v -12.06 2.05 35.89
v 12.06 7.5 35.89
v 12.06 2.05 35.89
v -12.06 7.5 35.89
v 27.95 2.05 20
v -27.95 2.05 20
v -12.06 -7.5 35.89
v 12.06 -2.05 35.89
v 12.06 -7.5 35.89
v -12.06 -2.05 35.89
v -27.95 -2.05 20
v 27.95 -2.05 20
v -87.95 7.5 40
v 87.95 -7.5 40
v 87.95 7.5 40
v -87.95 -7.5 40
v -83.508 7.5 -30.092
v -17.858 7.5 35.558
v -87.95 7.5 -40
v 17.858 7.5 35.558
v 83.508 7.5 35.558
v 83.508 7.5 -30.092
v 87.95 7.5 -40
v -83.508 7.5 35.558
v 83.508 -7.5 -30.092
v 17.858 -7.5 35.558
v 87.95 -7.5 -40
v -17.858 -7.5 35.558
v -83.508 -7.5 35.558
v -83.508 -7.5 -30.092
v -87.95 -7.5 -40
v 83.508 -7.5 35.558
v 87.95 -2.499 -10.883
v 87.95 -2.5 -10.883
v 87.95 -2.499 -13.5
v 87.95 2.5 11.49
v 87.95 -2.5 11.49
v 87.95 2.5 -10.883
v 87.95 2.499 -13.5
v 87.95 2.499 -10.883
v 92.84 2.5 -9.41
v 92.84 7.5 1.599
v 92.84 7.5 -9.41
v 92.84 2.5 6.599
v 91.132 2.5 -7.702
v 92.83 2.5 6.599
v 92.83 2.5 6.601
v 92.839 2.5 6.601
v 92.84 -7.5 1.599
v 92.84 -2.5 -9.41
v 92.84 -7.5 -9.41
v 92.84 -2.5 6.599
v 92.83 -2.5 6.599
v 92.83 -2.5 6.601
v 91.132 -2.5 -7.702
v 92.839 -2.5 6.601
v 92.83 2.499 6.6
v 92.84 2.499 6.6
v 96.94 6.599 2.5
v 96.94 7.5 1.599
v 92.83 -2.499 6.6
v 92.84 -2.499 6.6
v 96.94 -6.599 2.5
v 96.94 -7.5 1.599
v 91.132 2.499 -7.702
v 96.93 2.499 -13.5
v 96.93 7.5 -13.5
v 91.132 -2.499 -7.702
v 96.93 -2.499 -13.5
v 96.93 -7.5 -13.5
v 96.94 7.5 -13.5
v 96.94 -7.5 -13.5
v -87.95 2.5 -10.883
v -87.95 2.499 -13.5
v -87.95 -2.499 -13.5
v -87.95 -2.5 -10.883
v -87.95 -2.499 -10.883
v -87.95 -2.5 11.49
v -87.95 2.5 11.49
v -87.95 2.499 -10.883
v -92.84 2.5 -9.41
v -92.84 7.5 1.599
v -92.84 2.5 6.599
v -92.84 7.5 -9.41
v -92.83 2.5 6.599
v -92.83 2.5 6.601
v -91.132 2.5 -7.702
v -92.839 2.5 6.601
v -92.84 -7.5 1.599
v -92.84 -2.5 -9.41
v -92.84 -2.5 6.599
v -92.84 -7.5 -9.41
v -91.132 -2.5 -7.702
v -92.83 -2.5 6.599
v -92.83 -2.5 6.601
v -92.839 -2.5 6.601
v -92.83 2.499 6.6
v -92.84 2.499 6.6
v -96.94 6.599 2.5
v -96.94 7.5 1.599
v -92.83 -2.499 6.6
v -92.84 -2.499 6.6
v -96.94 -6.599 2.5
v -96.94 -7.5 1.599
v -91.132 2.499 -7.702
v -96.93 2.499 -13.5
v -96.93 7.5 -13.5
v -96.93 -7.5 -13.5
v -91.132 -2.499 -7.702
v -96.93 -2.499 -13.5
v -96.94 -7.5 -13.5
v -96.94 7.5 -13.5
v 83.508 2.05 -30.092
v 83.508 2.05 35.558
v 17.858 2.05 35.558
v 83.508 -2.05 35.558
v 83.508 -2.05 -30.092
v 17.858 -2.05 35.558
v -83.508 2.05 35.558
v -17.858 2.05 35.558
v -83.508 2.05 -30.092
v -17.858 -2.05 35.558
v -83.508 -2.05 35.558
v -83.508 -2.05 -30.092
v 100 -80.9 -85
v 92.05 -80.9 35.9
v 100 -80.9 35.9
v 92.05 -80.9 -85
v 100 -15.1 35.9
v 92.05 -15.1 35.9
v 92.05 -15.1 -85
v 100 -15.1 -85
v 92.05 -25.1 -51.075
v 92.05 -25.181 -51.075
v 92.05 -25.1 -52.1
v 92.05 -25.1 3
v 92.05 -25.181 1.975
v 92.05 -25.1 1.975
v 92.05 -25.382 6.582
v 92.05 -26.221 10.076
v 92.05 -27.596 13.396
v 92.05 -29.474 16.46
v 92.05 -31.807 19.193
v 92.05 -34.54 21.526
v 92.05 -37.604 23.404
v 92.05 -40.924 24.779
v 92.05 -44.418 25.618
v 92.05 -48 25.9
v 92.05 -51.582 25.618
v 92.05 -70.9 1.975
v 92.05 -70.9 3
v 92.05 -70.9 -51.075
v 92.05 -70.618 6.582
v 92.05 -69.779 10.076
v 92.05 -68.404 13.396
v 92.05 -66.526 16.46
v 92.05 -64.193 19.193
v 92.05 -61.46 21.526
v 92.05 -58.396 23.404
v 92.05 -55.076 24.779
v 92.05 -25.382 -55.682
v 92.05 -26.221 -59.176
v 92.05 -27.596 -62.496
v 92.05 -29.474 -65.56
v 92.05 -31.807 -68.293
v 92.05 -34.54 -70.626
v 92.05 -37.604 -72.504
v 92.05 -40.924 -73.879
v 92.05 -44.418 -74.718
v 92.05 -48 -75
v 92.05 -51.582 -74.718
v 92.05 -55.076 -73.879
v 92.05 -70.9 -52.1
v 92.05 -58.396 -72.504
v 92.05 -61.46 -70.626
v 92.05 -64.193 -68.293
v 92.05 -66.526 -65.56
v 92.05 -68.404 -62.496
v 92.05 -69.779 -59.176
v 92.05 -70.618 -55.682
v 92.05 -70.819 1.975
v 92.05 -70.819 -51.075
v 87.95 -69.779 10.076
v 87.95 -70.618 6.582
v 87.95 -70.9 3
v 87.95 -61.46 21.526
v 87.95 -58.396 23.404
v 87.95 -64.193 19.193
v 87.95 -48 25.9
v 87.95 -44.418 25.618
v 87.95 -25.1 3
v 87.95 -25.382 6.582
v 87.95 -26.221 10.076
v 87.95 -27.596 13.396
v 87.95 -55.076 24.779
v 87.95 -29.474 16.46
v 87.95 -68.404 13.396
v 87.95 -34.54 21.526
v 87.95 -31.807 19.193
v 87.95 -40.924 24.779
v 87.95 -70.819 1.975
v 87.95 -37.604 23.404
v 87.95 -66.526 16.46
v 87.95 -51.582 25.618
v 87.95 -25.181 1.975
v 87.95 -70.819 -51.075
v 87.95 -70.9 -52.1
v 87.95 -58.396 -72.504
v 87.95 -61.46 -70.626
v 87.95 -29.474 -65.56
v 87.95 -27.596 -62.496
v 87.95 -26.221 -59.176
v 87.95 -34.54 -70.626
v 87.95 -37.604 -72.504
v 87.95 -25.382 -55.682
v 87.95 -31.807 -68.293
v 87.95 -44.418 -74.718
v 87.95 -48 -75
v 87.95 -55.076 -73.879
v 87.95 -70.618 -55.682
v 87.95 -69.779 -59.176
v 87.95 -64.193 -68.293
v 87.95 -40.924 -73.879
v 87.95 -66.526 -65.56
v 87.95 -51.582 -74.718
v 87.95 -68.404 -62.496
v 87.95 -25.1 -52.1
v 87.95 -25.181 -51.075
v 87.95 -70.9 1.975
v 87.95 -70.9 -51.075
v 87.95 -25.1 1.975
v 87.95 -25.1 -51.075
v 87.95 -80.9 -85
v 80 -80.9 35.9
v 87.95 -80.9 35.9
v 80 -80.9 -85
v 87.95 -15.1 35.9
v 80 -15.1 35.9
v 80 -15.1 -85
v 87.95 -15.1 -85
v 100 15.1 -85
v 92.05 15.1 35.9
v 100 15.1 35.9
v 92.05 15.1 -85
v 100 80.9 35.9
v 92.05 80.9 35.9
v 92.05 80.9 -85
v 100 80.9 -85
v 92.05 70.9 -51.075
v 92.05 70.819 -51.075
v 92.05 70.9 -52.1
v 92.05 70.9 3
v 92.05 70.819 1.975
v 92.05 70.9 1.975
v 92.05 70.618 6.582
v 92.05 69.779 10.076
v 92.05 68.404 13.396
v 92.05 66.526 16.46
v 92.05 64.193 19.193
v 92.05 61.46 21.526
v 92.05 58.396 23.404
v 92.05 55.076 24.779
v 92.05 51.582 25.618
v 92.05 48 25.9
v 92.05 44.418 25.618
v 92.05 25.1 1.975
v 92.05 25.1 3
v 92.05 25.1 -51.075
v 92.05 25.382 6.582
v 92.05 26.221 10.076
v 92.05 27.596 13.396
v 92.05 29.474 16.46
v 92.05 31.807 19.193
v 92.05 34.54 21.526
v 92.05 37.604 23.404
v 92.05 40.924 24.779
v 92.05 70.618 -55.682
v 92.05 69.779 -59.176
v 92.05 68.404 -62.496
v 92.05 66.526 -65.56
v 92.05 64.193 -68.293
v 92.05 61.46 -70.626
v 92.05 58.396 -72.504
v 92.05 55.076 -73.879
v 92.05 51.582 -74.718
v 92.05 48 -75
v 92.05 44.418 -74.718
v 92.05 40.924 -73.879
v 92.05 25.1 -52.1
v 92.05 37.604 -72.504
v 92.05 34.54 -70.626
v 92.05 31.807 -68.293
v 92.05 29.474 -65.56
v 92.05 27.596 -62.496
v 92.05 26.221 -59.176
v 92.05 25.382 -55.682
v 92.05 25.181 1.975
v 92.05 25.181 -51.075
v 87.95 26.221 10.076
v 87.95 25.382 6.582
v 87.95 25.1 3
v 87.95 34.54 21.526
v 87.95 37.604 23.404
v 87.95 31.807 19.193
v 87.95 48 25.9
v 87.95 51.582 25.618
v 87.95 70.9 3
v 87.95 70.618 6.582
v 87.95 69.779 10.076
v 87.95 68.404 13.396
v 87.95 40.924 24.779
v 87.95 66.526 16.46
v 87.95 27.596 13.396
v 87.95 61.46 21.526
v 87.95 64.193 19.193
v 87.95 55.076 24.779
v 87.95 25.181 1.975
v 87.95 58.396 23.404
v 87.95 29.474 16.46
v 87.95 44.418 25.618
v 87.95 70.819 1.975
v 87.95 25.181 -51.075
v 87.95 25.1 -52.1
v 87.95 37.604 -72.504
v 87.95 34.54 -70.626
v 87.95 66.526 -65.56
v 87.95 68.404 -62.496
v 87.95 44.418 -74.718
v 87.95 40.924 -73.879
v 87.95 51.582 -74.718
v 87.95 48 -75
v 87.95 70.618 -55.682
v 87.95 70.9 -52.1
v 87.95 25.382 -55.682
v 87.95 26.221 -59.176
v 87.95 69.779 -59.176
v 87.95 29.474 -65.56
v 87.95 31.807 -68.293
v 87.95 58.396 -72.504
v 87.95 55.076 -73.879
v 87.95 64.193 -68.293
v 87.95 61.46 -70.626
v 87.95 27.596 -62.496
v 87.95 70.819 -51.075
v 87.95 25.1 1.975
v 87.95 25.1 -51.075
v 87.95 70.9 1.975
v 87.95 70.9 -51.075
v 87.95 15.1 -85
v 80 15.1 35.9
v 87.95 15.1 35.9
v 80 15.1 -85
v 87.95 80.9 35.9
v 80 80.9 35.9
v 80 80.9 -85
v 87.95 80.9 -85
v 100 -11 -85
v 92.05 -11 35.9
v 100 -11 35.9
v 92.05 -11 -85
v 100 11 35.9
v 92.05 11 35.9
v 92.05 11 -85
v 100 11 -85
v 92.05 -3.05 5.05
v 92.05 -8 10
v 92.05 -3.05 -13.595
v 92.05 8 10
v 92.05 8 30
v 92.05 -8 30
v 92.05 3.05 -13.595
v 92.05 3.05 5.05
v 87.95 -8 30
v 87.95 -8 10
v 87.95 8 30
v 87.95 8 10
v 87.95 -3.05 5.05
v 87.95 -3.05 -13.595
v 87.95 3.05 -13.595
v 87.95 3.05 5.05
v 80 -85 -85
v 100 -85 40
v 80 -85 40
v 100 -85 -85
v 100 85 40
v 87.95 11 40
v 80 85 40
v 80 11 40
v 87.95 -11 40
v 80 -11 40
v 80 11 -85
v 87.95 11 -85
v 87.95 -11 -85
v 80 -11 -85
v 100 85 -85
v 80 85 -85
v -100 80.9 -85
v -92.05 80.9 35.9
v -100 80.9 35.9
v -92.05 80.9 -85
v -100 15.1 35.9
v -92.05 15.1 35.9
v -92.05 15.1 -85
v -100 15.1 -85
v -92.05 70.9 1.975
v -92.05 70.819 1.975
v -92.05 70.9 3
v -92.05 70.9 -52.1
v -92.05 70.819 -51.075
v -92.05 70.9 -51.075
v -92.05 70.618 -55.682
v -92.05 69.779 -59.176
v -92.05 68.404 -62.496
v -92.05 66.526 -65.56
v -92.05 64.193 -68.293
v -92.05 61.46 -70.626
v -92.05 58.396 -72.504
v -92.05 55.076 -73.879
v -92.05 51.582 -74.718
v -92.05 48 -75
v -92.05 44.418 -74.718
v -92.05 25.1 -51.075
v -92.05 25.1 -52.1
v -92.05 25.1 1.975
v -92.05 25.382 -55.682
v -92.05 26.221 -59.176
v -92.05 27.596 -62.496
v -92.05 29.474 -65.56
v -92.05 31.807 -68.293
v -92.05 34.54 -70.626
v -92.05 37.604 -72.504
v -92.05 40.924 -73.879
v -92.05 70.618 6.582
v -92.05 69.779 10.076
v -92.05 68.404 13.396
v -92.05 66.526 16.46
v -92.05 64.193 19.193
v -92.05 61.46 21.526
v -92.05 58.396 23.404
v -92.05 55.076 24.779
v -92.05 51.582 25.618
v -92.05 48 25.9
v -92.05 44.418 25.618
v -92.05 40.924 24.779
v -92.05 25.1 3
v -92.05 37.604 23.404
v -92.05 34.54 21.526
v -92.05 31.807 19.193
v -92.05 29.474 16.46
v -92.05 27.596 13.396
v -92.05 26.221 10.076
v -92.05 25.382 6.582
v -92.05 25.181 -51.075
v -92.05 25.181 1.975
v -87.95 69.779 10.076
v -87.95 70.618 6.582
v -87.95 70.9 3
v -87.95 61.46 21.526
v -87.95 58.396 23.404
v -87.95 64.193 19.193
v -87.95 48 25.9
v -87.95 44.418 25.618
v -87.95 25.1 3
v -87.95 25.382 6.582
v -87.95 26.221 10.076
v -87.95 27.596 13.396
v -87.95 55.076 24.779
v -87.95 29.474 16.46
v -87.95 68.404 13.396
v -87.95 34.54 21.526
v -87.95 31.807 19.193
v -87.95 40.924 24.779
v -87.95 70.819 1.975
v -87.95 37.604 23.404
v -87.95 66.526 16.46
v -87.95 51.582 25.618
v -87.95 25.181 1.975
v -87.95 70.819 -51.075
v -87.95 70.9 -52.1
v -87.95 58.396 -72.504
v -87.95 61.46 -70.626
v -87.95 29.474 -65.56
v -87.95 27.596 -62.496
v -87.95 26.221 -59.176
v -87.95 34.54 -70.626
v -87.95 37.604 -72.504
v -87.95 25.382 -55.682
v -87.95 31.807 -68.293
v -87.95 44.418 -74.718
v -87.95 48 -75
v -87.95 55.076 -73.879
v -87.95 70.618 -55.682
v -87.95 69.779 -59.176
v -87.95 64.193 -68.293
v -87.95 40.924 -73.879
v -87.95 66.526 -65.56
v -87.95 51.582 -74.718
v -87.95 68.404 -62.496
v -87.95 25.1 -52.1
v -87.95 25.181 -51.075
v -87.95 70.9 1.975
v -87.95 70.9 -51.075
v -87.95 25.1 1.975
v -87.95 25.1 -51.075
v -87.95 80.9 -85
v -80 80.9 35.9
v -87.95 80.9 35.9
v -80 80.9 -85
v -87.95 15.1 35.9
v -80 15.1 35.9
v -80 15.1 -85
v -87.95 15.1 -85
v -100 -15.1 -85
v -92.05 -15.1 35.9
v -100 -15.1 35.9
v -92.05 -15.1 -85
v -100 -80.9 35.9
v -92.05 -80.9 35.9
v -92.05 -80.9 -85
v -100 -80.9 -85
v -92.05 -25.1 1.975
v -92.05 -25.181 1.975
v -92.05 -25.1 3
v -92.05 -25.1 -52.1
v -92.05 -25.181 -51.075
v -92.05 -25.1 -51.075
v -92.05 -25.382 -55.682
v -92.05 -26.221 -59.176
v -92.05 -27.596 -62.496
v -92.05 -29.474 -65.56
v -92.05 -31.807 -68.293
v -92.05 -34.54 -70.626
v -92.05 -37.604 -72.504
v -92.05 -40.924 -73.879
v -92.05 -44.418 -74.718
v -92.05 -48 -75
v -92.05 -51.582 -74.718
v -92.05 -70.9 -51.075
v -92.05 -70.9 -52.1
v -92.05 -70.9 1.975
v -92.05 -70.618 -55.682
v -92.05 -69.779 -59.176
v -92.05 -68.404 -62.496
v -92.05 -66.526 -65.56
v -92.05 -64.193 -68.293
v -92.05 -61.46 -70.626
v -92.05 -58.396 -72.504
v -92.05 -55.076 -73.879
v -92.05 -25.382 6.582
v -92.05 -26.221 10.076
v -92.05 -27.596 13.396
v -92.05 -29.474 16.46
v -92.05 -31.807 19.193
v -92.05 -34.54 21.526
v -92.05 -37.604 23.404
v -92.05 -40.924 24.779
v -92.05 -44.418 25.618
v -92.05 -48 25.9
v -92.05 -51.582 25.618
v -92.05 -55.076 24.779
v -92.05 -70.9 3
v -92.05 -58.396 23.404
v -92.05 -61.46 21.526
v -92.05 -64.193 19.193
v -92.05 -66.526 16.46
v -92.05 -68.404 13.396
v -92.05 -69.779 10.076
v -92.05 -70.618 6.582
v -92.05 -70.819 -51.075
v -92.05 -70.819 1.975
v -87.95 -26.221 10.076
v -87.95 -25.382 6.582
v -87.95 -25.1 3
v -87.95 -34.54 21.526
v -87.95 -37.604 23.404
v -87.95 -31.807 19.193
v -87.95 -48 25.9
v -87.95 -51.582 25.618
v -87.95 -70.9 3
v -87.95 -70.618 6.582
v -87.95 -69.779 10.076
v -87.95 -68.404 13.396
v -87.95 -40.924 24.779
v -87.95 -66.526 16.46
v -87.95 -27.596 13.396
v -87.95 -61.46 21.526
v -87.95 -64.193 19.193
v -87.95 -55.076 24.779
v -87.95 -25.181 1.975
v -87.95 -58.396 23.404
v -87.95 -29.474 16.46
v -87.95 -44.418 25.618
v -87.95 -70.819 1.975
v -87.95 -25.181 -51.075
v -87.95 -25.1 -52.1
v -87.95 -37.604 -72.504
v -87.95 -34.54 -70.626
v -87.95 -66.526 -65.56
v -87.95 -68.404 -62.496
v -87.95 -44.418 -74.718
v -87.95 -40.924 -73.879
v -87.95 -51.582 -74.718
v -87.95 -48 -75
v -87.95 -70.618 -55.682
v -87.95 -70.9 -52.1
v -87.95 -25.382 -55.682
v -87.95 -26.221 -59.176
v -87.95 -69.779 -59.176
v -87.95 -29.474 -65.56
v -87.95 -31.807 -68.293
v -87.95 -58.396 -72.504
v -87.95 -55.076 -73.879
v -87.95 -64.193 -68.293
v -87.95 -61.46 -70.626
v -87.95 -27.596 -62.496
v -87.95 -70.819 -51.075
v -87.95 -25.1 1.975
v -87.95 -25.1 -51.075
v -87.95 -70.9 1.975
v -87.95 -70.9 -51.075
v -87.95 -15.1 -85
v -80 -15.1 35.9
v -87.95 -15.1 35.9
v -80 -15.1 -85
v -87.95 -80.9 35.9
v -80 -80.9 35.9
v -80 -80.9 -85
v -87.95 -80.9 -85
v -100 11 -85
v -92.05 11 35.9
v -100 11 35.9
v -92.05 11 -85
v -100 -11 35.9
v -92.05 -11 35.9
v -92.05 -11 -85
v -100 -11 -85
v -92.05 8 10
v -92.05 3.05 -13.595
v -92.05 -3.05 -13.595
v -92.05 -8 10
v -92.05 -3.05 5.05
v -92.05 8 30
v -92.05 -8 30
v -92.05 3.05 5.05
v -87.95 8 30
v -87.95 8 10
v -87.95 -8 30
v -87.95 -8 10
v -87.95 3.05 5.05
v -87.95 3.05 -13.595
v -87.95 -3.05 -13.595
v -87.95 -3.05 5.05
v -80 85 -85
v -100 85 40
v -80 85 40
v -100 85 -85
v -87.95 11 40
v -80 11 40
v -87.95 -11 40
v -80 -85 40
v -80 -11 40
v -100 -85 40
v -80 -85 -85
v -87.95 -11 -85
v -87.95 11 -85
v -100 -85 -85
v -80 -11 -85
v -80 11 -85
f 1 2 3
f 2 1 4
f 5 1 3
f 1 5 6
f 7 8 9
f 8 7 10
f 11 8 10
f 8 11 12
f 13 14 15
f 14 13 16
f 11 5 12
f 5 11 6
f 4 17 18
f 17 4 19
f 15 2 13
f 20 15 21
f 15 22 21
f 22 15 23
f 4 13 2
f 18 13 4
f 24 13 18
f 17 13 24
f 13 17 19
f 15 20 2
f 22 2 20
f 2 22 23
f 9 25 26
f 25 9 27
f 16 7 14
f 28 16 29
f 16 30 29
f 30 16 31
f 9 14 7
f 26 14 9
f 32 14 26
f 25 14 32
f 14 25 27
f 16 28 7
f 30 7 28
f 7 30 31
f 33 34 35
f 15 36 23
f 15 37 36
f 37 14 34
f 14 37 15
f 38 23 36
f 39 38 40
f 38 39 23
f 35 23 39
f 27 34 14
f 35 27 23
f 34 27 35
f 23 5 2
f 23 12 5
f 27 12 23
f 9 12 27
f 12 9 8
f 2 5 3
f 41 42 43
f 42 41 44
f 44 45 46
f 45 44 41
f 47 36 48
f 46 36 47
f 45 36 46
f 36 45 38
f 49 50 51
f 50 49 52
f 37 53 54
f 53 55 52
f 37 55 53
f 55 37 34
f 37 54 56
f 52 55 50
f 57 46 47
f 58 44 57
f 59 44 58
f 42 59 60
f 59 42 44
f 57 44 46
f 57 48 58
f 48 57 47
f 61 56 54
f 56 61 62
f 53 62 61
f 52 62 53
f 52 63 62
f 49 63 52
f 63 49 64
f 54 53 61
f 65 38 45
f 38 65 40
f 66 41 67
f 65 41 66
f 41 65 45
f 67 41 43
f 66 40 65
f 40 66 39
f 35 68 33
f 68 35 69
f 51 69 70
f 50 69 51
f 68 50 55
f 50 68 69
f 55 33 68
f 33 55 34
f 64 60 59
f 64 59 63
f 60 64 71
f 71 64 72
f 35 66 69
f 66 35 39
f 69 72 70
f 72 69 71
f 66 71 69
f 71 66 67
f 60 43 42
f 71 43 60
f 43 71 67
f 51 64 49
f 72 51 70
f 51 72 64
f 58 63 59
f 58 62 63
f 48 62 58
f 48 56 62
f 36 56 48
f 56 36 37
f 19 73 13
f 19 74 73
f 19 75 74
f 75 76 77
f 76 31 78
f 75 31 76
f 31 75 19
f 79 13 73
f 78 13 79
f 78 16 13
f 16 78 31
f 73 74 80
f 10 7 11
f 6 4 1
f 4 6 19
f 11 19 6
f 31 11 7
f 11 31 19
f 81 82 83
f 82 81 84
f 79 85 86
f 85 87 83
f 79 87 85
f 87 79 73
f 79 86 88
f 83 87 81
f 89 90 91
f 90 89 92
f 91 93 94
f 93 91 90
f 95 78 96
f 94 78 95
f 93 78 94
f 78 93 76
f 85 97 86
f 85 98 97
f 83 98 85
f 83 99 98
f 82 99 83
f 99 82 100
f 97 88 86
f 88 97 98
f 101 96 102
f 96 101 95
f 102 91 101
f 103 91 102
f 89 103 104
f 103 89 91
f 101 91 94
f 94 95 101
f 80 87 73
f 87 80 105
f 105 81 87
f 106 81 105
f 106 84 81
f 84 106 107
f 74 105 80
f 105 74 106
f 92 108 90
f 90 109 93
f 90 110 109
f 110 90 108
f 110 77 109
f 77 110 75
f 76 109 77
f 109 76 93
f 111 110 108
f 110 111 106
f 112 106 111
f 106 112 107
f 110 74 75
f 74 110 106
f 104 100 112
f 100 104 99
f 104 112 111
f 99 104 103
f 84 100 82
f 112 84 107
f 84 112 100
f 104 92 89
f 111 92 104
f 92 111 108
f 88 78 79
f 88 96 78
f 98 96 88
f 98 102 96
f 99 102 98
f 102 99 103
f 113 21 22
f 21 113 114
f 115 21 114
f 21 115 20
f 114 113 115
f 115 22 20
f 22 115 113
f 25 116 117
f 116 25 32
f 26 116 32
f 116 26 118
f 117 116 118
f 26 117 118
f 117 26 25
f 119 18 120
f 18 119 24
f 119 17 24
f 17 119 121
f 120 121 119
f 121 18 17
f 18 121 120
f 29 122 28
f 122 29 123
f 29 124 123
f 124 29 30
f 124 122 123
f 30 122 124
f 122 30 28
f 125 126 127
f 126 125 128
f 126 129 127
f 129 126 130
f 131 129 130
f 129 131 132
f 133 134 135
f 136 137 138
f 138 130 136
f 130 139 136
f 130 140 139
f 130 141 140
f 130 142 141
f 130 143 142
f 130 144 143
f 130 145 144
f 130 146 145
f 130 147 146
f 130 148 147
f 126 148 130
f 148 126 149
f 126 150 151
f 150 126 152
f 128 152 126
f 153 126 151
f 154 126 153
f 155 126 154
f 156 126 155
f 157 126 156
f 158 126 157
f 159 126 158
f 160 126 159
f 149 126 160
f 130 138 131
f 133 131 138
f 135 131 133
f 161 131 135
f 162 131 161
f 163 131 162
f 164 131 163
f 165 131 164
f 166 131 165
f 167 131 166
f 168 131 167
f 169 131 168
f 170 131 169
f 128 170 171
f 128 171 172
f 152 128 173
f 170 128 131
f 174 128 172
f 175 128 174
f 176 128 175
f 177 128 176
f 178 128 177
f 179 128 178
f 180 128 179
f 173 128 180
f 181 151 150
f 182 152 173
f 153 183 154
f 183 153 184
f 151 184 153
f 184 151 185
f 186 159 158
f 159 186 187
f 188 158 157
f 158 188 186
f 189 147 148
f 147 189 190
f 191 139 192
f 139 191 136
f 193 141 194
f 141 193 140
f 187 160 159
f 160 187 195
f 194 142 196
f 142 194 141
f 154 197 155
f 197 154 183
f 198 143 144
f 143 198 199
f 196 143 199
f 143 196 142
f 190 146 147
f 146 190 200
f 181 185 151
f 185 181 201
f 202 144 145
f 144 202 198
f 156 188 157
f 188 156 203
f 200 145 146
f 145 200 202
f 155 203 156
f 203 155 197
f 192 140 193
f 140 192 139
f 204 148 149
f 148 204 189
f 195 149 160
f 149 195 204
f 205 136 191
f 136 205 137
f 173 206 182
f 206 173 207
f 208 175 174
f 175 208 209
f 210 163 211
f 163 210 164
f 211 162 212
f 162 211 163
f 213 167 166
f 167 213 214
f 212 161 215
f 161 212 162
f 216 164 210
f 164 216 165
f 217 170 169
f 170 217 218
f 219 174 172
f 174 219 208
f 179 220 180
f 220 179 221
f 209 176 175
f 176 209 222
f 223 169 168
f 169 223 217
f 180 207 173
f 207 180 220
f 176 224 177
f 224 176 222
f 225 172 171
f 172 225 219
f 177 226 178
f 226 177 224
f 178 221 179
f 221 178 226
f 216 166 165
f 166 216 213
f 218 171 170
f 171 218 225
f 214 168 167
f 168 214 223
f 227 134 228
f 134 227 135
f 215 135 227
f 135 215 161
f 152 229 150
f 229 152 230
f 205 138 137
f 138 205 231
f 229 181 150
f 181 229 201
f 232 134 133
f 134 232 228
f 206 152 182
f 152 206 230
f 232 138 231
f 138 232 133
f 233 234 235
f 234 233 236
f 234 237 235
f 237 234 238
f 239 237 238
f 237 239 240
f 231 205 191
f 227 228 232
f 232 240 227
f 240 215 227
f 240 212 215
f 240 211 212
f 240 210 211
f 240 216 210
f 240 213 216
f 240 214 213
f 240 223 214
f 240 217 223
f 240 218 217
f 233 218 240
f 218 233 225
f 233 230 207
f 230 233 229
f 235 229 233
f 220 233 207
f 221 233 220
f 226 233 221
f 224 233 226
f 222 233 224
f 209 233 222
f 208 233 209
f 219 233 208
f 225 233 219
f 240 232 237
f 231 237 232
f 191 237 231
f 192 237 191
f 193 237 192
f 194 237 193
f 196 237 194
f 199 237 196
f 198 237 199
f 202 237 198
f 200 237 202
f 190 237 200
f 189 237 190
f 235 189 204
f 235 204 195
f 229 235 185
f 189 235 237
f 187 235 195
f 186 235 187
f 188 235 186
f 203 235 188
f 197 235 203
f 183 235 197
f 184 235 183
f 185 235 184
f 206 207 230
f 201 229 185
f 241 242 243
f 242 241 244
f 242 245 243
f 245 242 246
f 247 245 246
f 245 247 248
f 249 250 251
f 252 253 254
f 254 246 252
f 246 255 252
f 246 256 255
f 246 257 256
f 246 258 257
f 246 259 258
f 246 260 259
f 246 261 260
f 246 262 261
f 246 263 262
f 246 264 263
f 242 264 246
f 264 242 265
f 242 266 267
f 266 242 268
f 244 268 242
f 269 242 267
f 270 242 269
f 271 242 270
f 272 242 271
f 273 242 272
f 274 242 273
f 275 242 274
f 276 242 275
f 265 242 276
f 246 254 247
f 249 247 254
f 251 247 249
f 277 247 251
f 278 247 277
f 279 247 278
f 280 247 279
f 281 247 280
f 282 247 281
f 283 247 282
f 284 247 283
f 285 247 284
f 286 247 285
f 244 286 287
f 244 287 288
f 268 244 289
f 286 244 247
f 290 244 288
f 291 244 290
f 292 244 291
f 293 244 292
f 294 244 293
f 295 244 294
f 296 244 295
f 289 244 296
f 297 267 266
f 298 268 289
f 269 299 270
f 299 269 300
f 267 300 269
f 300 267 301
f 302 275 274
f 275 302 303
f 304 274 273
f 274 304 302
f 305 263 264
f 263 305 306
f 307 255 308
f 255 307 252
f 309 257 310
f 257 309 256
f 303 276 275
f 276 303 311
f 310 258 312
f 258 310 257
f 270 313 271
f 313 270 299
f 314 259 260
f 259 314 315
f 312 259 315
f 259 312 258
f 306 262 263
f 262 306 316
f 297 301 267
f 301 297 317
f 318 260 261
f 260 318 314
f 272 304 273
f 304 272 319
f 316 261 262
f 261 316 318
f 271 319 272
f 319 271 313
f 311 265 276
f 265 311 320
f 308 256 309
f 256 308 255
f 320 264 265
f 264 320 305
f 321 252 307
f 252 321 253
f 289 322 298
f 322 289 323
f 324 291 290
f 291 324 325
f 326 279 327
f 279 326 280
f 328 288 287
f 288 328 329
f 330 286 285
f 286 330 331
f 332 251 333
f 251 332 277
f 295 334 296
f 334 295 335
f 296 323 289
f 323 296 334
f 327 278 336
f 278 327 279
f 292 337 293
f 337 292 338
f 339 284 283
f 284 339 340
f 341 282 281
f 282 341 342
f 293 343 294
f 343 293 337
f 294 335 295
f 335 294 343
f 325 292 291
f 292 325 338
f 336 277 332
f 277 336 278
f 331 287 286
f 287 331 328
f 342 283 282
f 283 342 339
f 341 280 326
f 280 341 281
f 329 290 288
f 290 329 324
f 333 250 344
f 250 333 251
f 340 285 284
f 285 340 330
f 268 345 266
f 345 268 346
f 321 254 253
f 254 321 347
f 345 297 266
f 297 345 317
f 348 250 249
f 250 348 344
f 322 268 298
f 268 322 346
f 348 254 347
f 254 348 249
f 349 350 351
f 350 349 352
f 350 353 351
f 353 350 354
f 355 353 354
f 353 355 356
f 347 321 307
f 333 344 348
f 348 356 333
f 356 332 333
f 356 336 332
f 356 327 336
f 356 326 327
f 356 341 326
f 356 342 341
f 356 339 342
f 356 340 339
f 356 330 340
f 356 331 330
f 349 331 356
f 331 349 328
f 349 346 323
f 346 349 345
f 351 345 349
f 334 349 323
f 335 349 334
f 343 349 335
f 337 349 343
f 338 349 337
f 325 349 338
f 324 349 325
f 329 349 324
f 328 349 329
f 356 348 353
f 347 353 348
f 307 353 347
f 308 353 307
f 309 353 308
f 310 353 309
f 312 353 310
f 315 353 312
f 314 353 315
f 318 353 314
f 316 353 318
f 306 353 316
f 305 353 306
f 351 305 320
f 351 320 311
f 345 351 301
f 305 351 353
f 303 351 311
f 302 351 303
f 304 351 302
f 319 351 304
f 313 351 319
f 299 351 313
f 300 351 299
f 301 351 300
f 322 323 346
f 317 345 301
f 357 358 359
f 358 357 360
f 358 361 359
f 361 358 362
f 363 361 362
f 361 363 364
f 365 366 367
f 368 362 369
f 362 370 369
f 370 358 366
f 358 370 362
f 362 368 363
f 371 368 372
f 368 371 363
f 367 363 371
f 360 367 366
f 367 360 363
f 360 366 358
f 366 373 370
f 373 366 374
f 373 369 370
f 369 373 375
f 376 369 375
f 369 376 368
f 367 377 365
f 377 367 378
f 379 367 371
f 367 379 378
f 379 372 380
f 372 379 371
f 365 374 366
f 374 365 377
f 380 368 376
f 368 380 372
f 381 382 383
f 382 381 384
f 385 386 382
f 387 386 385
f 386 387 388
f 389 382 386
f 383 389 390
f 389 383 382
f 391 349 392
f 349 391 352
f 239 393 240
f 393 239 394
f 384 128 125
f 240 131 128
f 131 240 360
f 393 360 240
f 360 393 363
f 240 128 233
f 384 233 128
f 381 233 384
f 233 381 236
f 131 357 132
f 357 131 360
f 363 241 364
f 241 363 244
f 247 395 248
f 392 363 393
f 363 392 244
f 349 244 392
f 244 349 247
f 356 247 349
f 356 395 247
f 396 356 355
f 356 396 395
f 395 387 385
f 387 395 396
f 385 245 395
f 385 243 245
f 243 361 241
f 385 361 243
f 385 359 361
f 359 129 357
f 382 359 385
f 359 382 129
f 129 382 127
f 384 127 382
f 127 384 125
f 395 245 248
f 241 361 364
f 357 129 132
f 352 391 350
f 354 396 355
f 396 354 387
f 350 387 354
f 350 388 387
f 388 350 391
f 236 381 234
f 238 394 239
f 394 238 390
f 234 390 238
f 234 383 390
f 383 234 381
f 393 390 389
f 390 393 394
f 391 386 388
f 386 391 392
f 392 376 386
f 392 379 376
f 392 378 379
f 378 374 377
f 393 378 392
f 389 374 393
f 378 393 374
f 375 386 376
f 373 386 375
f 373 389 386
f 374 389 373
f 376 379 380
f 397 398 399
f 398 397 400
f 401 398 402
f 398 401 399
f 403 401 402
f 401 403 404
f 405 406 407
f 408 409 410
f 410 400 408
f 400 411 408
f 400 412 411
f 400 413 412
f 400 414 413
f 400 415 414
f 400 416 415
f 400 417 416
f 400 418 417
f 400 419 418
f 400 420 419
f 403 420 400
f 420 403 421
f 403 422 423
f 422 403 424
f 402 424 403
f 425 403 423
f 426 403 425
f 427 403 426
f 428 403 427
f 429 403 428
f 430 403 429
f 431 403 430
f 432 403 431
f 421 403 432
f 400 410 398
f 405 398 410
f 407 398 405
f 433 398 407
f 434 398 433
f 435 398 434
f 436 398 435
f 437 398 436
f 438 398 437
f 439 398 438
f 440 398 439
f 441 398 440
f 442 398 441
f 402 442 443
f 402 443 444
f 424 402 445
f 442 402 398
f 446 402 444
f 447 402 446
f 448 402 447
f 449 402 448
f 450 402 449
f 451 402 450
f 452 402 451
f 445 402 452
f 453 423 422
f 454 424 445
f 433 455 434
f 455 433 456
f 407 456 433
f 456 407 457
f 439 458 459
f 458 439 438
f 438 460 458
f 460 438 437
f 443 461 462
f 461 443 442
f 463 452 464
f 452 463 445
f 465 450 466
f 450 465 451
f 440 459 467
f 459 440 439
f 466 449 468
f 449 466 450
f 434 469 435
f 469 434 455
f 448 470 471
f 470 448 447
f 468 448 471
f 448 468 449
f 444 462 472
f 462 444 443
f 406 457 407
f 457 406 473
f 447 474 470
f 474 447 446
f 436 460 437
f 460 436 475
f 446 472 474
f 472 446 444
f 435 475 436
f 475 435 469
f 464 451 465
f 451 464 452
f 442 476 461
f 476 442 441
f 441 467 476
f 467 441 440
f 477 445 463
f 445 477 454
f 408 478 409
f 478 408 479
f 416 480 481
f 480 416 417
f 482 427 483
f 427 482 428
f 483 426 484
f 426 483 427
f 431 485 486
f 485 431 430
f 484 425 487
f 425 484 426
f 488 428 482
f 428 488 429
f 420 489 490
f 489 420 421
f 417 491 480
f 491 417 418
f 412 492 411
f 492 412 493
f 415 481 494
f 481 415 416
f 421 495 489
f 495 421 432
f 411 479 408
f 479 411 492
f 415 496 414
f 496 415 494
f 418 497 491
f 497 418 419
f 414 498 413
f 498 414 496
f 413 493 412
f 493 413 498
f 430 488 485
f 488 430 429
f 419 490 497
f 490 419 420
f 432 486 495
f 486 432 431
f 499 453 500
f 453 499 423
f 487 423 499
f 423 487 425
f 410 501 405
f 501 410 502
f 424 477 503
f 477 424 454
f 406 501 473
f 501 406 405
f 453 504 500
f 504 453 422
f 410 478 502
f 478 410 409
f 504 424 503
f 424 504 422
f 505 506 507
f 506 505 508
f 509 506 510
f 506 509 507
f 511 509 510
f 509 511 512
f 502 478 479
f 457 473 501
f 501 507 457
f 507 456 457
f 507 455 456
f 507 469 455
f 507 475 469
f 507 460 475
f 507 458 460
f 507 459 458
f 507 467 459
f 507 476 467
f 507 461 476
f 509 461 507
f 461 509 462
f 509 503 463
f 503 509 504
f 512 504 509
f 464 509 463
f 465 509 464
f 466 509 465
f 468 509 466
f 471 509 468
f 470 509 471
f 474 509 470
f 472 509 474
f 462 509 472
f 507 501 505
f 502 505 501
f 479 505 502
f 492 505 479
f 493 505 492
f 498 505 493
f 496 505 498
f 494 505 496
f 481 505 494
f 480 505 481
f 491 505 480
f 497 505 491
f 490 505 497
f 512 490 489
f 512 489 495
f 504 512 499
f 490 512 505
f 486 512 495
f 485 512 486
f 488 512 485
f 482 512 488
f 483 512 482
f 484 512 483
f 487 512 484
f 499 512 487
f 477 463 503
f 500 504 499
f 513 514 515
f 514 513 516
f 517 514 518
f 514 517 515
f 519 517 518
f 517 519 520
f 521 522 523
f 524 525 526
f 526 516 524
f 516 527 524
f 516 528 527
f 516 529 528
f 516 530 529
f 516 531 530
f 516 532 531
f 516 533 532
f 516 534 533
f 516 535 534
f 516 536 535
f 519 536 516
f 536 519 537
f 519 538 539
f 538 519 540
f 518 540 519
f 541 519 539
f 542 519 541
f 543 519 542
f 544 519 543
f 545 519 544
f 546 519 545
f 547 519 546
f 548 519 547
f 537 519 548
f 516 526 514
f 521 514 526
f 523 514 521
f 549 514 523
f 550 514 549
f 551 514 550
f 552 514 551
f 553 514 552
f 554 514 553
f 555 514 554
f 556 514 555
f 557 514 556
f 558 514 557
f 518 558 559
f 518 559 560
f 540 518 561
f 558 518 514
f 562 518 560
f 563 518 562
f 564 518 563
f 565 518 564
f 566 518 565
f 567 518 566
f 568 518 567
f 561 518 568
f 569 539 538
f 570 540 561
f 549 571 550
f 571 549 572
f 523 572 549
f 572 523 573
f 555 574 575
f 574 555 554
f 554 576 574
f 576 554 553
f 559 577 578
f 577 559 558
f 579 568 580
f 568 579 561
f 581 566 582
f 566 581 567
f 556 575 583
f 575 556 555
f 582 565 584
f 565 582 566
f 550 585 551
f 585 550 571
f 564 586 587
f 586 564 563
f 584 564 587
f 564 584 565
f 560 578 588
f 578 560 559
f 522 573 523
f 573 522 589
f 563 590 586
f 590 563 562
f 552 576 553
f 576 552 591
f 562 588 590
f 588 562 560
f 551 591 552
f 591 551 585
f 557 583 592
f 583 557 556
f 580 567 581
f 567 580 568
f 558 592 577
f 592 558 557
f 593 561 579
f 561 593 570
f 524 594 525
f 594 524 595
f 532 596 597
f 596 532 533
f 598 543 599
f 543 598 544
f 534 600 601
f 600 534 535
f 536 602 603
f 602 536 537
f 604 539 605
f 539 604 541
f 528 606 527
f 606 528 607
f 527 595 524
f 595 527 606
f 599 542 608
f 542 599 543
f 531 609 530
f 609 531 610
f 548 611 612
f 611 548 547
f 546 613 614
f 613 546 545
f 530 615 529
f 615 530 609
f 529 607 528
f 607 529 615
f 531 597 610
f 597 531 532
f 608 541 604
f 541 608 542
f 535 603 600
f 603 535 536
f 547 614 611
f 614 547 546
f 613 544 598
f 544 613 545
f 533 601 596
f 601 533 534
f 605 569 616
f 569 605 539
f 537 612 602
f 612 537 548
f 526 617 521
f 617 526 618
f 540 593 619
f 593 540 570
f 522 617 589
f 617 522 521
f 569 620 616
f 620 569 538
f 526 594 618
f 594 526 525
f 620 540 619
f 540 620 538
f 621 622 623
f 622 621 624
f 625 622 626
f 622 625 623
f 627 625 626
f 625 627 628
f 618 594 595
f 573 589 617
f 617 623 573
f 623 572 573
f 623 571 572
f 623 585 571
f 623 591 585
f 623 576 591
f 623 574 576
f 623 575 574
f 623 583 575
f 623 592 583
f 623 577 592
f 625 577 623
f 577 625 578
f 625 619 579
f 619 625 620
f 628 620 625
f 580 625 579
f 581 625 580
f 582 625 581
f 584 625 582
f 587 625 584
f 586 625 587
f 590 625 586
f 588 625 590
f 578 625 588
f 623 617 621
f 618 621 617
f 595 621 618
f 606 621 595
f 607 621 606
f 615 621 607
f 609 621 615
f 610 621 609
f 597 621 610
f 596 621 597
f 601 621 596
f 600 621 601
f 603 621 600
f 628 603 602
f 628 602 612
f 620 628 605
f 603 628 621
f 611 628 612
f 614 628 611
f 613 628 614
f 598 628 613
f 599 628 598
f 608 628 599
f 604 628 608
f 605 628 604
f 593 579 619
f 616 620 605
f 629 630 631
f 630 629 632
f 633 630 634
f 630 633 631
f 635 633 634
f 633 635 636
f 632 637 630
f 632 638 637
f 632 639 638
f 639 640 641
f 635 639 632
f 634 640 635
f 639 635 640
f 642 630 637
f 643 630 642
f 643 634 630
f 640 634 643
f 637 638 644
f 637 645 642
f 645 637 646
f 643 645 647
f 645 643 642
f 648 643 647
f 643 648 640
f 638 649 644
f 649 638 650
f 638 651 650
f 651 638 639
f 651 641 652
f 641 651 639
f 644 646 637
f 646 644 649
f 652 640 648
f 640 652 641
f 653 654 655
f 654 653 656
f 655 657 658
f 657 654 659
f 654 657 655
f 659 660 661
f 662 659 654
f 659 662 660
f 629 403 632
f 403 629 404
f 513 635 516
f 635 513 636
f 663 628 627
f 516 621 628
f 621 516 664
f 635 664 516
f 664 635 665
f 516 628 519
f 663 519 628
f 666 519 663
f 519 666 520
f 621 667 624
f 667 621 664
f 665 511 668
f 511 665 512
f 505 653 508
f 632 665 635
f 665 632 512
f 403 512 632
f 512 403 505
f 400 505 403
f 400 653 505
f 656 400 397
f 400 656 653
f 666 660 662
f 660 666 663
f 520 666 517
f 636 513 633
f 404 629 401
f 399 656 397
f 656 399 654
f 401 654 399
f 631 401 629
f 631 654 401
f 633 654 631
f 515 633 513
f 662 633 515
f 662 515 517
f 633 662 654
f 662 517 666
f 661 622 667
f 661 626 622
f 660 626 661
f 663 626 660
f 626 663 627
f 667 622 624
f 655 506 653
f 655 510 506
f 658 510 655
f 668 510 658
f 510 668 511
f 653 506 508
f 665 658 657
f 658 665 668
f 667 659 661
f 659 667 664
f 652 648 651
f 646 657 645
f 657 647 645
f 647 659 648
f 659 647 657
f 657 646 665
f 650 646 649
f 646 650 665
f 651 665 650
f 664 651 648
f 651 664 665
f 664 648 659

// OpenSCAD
// Measure left to right of monitor base from outer edge of monitor's rubber feet (mm).
Stand_Width = 200;          // [100:300]

// Measure front to rear of monitor base (mm).
Stand_Depth = 170;          // [100:300]

// Overall height of the stand (mm).
Stand_Height = 125;         // [80:300]

// Width of side walls, should at least match the diameter of the monitor's rubber feet.
Wall_Width = 20;            // [10:50]

// Applies to the thickness of everything.
Overall_Thickness = 4.1;    // [0.1:0.1:9.9]

// Adds error compensation to interlock joint gaps, use the fitment test print to trial for your printer.
Fitment_Adjust = 0.8;       // [0:0.1:3]

// Leave off to speed up viewing, enable before creating.
Rounded_Corners = "No";     // [Yes,No]

// Select part to view.
Build = "Assembled";        // [Wall:Wall,Support:Support,Assembled:Assembled Stand,Fit_Test:Joint fitment test, Print_Bed:All 3 parts laid out for printing]

/* [Hidden] */

WW = Wall_Width;                                    // Wall Width
TH = Overall_Thickness;                             // Thickness
L = Stand_Width - WW - TH;                          // Length
W = Stand_Depth;                                    // Width
H = Stand_Height;                                   // Height
FW = 10;                                            // Section Frame Width
CW = 22;                                            // Center Width
R = (Rounded_Corners == "Yes" ? 3.5 : 0);           // Rounded Edge Radius
TA = Fitment_Adjust;                                // Joint gap fitment compensation adjustment
SW = 15;                                            // Support Width
SH = 20;                                            // Support Height
TL = 80;                                            // Triangle Length
LH = 25;                                            // Latch Height
LP = 1;                                             // Latch Position
HP = 10;                                            // Hole Position
HH = 20;                                            // Hole Height
HW = 16;                                            // Hole Width
GH = 23.6;                                          // Gap Height
GW = 5.3;                                           // Gap Width
WR = ((W / 2) - ((TH + FW) * 2) - (CW / 2)) / 2;    // Frame void radius if height is within limit
HR = (H - TH - (FW * 2)) / 2;                       // Frame void radius if height is outside limit
$fn = 40;                                           // Number of sides in a circle

// Build wall
if(Build == "Wall")
{
    wall();
}

// Build support
else if(Build == "Support")
{
    support();
}


// Build assembled stand
else if(Build == "Assembled")
{
    rotate(a = [180, 0,0])
    {
        support();
       
        for(X = [1, -1])
            translate(v = [(L + TH) / 2 * X, 0, (H - TL) / 2])
                rotate(a = [0, 0, 90 * X])
                    wall();
    }
}

else if(Build == "Fit_Test")
{
    // Create latch hole only.
    translate(v = [0, 0, H / 2])
        difference()
        {
            wall();

            translate(v = [(W / 4) + (CW / 2) + TH, 0, 0])
                cube(size = [W / 2, WW * 2, H * 1.1], center = true);
            translate(v = [-(W / 4) - (CW / 2) - TH, 0, 0])
                cube(size = [W / 2, WW * 2, H * 1.1], center = true);
            translate(v = [0, 0, H / 2])
                cube(size = [CW + (TH * 3), WW * 2, (H * 2) - (TL * 2)], center = true);
        }
    
    // Create latch tab only.
    translate(v = [(L / 2) - (TL / 2), 0, TL / 2])
        difference()
        {
            support();
            
            translate(v = [15, 0, 0])
                cube(size = [L, SW * 1.1, H], center = true);
        }
}

else if(Build == "Print_Bed")
{   
    rotate(a = [0, 0, 45])
    {
        translate(v = [0, 0, TL / 2])
        support();
        for(X = [1, -1])
        translate(v = [0, X * WW * 1.5, H / 2])
        wall();
    }
}

module support()
{
    rotate(a = [180, 0, 0])
        difference()
        {
            union()
            {
                translate(v = [0, 0, (TL / 2) - (SH / 2)])
                    difference()
                    {
                        cube(size = [L, SW, SH], center = true);

                        for(X = [1, -1])
                            translate(v = [0, X * ((SW / 2) - (((SW / 2) - TH) / 2)), -TH / 2 - 0.01])
                                cube(size = [L - (TH * 2), SW / 2, SH - TH], center = true);
                    }
       
                for(X = [1, -1])
                {
                    translate(v = [((L / 2) - (TL / 2)) * X, 0, 0])
                        triangle(size = [TL, SW, TL], dir = X);          

                    translate(v = [((L / 2) + (((TH * 2) + TA) / 2) - 0.01) * X, 0, -LP])
                        difference()
                        {
                            cube(size = [(TH * 2) + TA, SW, LH], center = true);

                            for(Y = [1, -1])
                                translate(v = [-X * (TH / 2), Y * SW / 1.5, 0])
                                    cube(size = [TH + TA, SW, LH + 0.01], center = true);

                            translate(v = [(TA + (TH * 2)) / 2 * -X, -SW, LH / 2])
                                rotate (a = [0, 180 + (-90 * X) - 45, 0])
                                    cube(size = [(TA + TH) * 6, SW * 2, (TA + TH) * 6]);
              
                            for(Y = [1, -1])
                                translate(v = [(-0.01 * X) + TH - (TA / 2 * -X) + (TH * X), SW * 0.1666 * Y, (LH / 2) - TA - TH])
                                    rotate (a =[0, 45 - 90 + (90 * Y), 90])
                                        cube(size = [TH * 2, TH * 2, TH * 2]);

                            for(Y = [1, -1])
                                translate(v = [(-0.01 * X) +  - (TA / 2 * -X) + (TH * X), SW * 0.1666 * Y, -(LH / 2)])
                                    rotate (a =[45 - (45 * Y), 45 + 90 + (90 * X), 0])
                                        cube(size = [TH * 2, TH * 2, TH * 2]);
                        }
                }
            }

            for(X = [1, -1])
                for(Y = [1, -1])
                    translate(v = [((L / 2) - (TL / 2) + (TH / 1.5)) * X, Y * ((SW / 2) - (((SW / 2) - TH) / 2)), TH / 1.5])
                        triangle(size = [TL - (TH * 3.5), SW / 2, TL - (TH * 3.5)], dir = X);
        }
}

module wall()
{
    rotate(a = [180, 0, 0])
        difference()
        {
            // Main wall structure
            cube(size = [W, WW, H], center = true);
   
            // Remove outside section material
            for(X = [1, -1])
                for(Y = [1, -1])
                {
                    // Remove to create inset area
                    translate(v = [(W + CW) / 4 * X, Y * ((WW / 2) - (((WW / 2) - TH) / 2)), -TH])
                        roundedBox(size = [(W / 2) - (TH * 2) - (CW / 2), WW / 2, H], center = true, radius = R);

                    // Remove to create hole/frame
                    if(H - TH - FW - FW < (WR * 2))                   // Check if frame radius is valid for given height
                    {
                        // Frame radius is too big for height, limit for given height instead
                        translate(v = [(W + CW) / 4 * X, 0, (((H - TH) / 2) - HR - FW) - (TH / 2)])                    
                            rotate(a = [90, 0, 0])
                                cylinder(r = HR, h = WW / 2, center = true);
                    }
                    
                    else
                    {
                        for(Z = [1, -1])
                            translate(v = [(W + CW) / 4 * X, 0, (Z * (((H - TH) / 2) - WR - FW)) - (TH / 2)])                    
                                rotate(a = [90, 0, 0])
                                    cylinder(r = WR, h = WW / 2, center = true);
                        translate(v = [(W + CW) / 4 * X, 0, -TH / 2])
                            cube(size = [(W / 2) - ((TH + FW) * 2) - (CW / 2), WW / 2, (2 * (((H - TH) / 2) - WR - FW)) - (TH / 2)], center = true);
                    }
                }
            
            // Remove to create inset in middle
            translate(v = [0, ((WW / 2) - (((WW / 2) - TH) / 2)), -TH])
                roundedBox(size = [CW, WW / 2, H], center = true, radius = R);
            translate(v = [0, -((WW / 2) - (((WW / 2) - TH) / 2)), 0])
                cube(size = [CW, WW / 2, H + 0.01], center = true);
                
            // Remove hole and channel for center support interlock
            translate(v = [0, 0, (H / 2) - HP - (HH / 2)])
            {
                cube(size = [HW, TH + 0.01, HH], center = true);
                translate(v = [0, 0, -(GH + HH - 0.01) / 2])
                    cube(size = [GW + TA, TH + 0.01, GH], center = true);
            }

            // Angle hole for printing
            for(X = [1, -1])
                translate(v = [X * HW / 2, -TH, (H / 2) - HP - HH])
                    rotate(a = [0, 45 + 90 + (X * 90), 0])
                        cube(size = [HW / 2, HW / 2, HW / 2]);
        }
}

module triangle(size, dir)
{
    difference()
    {
        cube(size, center = true);
    
        translate(v = [-(dir * size[0] / 2), -size[1], size[2] / 2])
            rotate(a = [0, 135, 0])
                cube(size = [size[0] * 1.5, size[1] * 2, size[2] * 1.5]);
    }
}

// --- from MCAD/boxes.scad
module roundedBox(size, radius, sidesonly)
{
	rot = [ [0,0,0], [90,0,90], [90,90,0] ];
	if (sidesonly)
	{
		cube(size - [2*radius,0,0], true);
		cube(size - [0,2*radius,0], true);
		for (x = [radius-size[0]/2, -radius+size[0]/2],
			y = [radius-size[1]/2, -radius+size[1]/2])
		{
			translate([x,y,0]) cylinder(r=radius, h=size[2], center=true);
		}
	}
	else
	{
		cube([size[0], size[1]-radius*2, size[2]-radius*2], center=true);
		cube([size[0]-radius*2, size[1], size[2]-radius*2], center=true);
		cube([size[0]-radius*2, size[1]-radius*2, size[2]], center=true);

		for (axis = [0:2])
		{
			for (x = [radius-size[axis]/2, -radius+size[axis]/2],
				y = [radius-size[(axis+1)%3]/2, -radius+size[(axis+1)%3]/2])
			{
				rotate(rot[axis])
				translate([x,y,0])
					cylinder(h=size[(axis+2)%3]-2*radius, r=radius, center=true);
			}
		}
		for (x = [radius-size[0]/2, -radius+size[0]/2],
			y = [radius-size[1]/2, -radius+size[1]/2],
			z = [radius-size[2]/2, -radius+size[2]/2])
		{
			translate([x,y,z]) sphere(radius);
		}
	}
}
